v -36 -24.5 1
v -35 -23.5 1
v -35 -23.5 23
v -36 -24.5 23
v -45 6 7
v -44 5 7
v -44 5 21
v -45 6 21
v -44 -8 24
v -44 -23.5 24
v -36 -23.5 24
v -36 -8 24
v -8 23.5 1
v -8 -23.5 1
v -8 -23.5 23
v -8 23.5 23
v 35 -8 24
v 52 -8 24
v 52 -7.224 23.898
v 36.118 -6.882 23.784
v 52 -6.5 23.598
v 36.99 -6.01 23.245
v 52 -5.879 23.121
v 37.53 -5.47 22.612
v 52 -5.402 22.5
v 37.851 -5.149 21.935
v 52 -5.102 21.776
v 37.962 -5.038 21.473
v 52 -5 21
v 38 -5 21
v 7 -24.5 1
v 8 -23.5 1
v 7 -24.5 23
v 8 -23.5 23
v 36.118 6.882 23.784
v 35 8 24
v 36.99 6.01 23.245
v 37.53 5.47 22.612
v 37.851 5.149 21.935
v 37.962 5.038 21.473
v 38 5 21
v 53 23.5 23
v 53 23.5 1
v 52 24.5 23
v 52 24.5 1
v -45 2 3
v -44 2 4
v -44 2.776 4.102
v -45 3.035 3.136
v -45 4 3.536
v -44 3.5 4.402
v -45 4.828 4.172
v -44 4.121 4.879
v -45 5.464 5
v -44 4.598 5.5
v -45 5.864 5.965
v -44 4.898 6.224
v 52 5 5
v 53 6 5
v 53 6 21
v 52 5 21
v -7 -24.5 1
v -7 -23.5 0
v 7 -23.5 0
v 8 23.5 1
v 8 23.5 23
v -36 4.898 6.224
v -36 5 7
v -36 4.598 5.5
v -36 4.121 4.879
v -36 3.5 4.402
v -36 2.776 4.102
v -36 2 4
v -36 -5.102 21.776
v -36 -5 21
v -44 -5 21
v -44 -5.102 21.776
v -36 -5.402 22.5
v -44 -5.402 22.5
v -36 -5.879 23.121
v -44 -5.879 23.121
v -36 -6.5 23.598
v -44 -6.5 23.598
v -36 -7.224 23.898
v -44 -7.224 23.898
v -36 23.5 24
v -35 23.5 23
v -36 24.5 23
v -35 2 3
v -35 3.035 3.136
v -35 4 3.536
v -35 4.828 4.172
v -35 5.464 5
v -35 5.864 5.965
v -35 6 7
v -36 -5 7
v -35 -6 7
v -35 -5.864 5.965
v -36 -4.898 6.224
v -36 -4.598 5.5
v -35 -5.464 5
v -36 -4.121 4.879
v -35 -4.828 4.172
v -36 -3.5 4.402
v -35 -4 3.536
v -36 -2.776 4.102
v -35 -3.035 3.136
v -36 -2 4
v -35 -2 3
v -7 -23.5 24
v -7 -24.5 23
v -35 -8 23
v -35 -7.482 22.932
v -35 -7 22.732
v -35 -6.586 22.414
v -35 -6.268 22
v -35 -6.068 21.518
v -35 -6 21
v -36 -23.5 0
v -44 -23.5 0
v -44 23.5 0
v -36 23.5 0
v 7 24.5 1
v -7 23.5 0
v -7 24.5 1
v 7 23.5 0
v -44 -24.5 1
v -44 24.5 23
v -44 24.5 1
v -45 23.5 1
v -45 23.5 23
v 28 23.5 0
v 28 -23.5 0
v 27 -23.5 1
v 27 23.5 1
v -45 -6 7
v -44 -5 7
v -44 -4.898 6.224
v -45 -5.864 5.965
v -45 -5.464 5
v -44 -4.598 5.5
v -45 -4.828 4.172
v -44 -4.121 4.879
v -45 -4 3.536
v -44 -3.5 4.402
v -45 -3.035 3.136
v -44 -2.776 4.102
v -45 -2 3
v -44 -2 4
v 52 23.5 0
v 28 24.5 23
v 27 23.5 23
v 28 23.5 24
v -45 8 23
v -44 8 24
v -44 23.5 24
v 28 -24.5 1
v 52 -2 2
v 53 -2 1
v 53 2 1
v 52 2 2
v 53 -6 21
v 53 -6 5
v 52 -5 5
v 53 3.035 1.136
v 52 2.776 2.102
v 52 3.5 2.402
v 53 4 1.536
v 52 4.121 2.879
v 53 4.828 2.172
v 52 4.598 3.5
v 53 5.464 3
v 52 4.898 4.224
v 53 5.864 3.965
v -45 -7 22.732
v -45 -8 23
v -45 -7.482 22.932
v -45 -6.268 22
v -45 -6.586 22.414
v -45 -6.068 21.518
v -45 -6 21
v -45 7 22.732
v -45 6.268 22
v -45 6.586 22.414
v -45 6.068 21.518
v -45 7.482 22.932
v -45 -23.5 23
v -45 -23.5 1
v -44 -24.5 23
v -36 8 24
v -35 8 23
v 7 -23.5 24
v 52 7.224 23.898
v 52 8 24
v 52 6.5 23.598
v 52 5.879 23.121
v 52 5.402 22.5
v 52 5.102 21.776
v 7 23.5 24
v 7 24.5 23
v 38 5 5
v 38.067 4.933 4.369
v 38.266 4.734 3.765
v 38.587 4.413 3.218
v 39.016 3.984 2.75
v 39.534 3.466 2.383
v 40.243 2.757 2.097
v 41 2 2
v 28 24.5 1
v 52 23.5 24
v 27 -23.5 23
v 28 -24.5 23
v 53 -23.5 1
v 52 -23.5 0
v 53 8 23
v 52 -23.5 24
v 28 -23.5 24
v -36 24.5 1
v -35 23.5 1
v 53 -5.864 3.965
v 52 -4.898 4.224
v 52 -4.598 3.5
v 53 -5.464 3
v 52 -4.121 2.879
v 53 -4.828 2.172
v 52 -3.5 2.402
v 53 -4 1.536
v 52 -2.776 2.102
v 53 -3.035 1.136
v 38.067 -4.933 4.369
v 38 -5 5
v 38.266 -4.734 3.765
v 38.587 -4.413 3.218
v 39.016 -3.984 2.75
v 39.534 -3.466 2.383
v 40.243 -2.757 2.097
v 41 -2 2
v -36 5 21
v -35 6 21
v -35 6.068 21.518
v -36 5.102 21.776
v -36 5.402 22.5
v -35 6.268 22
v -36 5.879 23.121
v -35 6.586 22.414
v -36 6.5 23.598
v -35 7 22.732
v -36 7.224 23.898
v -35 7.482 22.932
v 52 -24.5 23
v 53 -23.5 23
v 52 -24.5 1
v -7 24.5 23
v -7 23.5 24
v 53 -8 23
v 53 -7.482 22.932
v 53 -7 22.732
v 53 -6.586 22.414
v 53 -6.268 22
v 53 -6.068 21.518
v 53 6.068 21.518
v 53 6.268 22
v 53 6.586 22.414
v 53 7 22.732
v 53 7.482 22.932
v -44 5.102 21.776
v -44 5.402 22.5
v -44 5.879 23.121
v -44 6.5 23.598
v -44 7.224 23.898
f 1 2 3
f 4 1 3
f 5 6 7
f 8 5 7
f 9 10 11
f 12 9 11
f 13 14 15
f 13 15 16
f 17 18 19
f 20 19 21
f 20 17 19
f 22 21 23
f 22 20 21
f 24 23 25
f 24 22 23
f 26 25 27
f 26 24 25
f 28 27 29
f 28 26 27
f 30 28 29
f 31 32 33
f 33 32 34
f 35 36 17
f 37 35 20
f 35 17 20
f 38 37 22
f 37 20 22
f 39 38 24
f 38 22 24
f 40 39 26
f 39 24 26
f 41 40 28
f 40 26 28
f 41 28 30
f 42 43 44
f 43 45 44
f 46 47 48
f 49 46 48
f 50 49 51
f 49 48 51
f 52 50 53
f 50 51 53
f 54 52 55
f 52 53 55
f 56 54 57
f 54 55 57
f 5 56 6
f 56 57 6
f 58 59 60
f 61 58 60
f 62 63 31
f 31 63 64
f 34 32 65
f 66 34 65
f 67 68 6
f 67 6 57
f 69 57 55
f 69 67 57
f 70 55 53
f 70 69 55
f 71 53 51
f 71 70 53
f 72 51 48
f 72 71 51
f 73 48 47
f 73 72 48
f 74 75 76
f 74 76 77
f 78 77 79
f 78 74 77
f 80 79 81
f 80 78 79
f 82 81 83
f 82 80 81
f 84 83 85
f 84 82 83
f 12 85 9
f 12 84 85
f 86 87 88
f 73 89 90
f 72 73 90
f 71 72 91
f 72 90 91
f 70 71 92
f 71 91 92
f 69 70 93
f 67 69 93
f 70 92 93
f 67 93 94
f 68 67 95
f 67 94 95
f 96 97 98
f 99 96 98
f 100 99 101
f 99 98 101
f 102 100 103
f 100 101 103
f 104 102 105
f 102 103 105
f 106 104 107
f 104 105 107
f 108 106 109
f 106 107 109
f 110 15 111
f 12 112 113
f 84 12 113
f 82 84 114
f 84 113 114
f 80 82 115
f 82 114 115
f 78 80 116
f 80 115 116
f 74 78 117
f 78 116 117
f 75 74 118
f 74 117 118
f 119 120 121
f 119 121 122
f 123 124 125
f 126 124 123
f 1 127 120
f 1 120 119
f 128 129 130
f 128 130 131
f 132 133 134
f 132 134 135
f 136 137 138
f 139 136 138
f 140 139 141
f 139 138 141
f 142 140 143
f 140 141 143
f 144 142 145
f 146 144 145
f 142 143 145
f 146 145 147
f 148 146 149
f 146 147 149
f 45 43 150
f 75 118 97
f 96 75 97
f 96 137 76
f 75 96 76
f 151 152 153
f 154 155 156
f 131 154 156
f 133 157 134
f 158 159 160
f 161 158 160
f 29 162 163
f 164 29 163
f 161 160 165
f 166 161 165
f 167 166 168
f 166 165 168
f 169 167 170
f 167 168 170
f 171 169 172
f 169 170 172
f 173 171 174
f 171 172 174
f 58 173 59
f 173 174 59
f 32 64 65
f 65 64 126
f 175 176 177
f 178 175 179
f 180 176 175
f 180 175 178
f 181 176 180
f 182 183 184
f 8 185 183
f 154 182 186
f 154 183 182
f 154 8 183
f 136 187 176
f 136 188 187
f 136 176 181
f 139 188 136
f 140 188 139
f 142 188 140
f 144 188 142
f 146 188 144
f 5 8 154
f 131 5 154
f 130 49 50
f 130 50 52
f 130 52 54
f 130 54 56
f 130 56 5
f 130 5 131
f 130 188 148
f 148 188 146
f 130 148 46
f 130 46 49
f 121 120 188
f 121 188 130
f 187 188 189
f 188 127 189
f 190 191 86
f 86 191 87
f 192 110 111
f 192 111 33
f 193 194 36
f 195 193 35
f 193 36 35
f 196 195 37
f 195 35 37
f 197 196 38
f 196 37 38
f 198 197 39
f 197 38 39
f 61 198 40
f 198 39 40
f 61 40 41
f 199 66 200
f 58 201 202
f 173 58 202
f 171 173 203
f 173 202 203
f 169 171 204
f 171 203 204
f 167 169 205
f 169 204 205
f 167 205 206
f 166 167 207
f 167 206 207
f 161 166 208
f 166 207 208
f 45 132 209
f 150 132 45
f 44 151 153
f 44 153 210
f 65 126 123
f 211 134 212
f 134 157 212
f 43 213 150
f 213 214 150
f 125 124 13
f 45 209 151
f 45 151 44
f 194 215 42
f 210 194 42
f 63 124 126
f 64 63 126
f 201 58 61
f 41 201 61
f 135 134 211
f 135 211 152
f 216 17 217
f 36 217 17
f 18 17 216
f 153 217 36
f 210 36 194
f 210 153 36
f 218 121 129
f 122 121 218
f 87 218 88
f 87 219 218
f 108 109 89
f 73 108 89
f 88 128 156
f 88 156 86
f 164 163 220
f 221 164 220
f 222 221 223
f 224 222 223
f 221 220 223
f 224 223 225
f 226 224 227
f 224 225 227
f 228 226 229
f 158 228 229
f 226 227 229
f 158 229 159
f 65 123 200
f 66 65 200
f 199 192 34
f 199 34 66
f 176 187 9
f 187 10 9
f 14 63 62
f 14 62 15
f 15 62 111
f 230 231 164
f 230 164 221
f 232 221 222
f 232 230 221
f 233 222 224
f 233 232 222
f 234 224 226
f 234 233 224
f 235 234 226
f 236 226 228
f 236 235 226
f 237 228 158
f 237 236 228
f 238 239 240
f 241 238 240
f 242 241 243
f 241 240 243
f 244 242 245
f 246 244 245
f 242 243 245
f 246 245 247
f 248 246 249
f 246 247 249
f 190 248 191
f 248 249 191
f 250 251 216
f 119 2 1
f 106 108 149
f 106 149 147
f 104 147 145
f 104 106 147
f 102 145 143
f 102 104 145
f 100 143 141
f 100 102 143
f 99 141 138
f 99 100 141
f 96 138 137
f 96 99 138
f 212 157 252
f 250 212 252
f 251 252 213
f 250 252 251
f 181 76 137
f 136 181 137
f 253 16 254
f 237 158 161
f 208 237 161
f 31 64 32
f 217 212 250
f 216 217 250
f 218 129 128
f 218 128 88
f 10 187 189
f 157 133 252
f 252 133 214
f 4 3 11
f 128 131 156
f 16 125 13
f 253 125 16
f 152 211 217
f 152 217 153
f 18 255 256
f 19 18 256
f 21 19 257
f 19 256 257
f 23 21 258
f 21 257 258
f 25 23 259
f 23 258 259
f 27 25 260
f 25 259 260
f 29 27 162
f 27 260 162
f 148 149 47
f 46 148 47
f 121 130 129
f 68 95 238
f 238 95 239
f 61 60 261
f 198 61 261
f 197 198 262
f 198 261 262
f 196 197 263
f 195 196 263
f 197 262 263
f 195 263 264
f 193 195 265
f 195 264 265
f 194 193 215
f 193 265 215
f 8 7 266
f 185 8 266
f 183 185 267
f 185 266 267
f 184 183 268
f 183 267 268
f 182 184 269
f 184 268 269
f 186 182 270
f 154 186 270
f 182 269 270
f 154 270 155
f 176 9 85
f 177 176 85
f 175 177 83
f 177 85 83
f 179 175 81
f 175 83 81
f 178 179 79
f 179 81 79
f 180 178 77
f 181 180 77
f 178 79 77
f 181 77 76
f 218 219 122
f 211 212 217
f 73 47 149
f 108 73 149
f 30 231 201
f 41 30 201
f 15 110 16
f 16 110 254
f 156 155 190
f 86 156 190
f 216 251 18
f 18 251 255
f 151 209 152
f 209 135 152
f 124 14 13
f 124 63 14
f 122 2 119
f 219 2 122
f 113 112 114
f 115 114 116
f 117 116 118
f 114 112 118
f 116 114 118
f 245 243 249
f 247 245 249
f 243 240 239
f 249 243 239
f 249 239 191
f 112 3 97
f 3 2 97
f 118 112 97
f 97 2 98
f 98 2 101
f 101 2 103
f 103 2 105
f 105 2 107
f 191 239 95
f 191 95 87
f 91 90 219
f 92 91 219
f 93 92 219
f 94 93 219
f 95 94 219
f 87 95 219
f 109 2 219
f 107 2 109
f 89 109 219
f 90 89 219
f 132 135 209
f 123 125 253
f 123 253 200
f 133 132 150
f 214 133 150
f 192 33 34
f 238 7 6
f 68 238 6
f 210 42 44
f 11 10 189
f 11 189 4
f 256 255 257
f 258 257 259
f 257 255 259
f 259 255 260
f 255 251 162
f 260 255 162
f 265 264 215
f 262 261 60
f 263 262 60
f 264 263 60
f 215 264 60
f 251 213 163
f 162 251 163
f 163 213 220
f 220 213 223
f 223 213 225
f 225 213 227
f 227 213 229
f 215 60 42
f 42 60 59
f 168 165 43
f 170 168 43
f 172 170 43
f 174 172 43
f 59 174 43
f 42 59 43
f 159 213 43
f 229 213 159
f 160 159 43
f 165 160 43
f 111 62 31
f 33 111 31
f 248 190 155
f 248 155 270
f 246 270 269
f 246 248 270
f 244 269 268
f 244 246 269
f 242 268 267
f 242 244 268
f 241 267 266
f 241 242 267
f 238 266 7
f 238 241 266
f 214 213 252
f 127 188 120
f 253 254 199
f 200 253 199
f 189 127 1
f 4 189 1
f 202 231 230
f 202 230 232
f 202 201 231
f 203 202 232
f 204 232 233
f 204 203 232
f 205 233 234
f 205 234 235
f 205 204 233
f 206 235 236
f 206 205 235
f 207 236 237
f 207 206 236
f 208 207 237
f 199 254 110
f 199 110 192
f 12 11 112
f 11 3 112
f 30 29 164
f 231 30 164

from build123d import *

# Parameters (mm, degrees)
F0_W       = 16
F0_H       = 49
F1_DEPTH   = 24
F2_SIZE    = 1
F0_W_2     = 26
F3_DEPTH   = 24
F5_DEPTH   = 15
F0_W_3     = 10
F6_DEPTH   = 24
F8_DEPTH   = 26
F9_R       = 3
F9_2_R     = 3
F10_SIZE   = 0.99999
F10_2_SIZE = 0.99999


# Not quite as in the source:
# - a fillet or chamfer is up to 0.001 mm smaller than in the source, because OpenCascade refuses the exact size


with BuildPart() as f1:
    # F0 (on Top) → F1 (new body)
    with BuildSketch(Plane.XY):
        Rectangle(F0_W, F0_H)
    extrude(amount=F1_DEPTH)

    # F2
    f2_edges = [f1.edges().sort_by_distance(p)[0] for p in [
        (-8, 0, 0),
        (0, -24.5, 0),
        (8, 0, 0),
        (0, 24.5, 0),
        (8, -24.5, 12),
        (8, 24.5, 12),
        (-8, 24.5, 12),
        (-8, -24.5, 12),
        (-8, 0, 24),
        (0, -24.5, 24),
        (8, 0, 24),
        (0, 24.5, 24),
    ]]
    chamfer(f2_edges, length=F2_SIZE)


with BuildPart() as f3:
    # F0 (on Top) → F3 (new body)
    with BuildSketch(Plane.XY):
        with Locations((40, 0)):
            Rectangle(F0_W_2, F0_H)
    extrude(amount=F3_DEPTH)

    # F4 (on face) → F5 (cut)
    with BuildSketch(Plane.YZ.offset(53)):
        Polygon((-5, 2), (0, 2), (5, 2), (5, 24), (-5, 24), align=None)
    extrude(amount=-F5_DEPTH, mode=Mode.SUBTRACT)

    # F9
    f9_edges = [f3.edges().sort_by_distance(p)[0] for p in [
        (45.5, 5, 2),
        (45.5, -5, 2),
        (38, 0, 2),
        (45.5, 5, 24),
        (38, 0, 24),
        (45.5, -5, 24),
    ]]
    fillet(f9_edges, radius=F9_R)

    # F10 (size 1 in the source; OpenCascade refuses exactly that, so slightly less here)
    f10_edges = [f3.edges().sort_by_distance(p)[0] for p in [
        (53, 16.25, 24),
        (53, 5.87868, 23.12132),
        (53, 24.5, 12),
        (53, 5, 13),
        (53, 0, 0),
        (53, 4.12132, 2.87868),
        (53, -24.5, 12),
        (53, 0, 2),
        (53, -16.25, 24),
        (53, -4.12132, 2.87868),
        (53, -5.87868, 23.12132),
        (53, -5, 13),
        (27, -24.5, 12),
        (40, -24.5, 0),
        (40, -24.5, 24),
        (27, 24.5, 12),
        (27, 0, 0),
        (27, 0, 24),
        (40, 24.5, 0),
        (40, 24.5, 24),
    ]]
    chamfer(f10_edges, length=F10_SIZE)


with BuildPart() as f6:
    # F0 (on Top) → F6 (new body)
    with BuildSketch(Plane.XY):
        with Locations((-40, 0)):
            Rectangle(F0_W_3, F0_H)
    extrude(amount=F6_DEPTH)

    # F7 (on face) → F8 (cut)
    with BuildSketch(Plane(origin=(-45, 0, 0), x_dir=(0, -1, 0), z_dir=(-1, 0, 0))):
        Polygon((-5, 4), (0, 4), (5, 4), (5, 24), (-5, 24), align=None)
    extrude(amount=-F8_DEPTH, mode=Mode.SUBTRACT)

    # F9#2
    f9_2_edges = [f6.edges().sort_by_distance(p)[0] for p in [
        (-40, -5, 4),
        (-40, 5, 4),
        (-40, 5, 24),
        (-40, -5, 24),
    ]]
    fillet(f9_2_edges, radius=F9_2_R)

    # F10#2 (size 1 in the source; OpenCascade refuses exactly that, so slightly less here)
    f10_2_edges = [f6.edges().sort_by_distance(p)[0] for p in [
        (-45, -16.25, 24),
        (-45, -5.87868, 23.12132),
        (-45, -24.5, 12),
        (-45, -5, 14),
        (-45, 0, 0),
        (-45, -4.12132, 4.87868),
        (-45, 24.5, 12),
        (-45, 0, 4),
        (-45, 16.25, 24),
        (-45, 4.12132, 4.87868),
        (-45, 5.87868, 23.12132),
        (-45, 5, 14),
        (-35, 16.25, 24),
        (-35, 5.87868, 23.12132),
        (-35, 24.5, 12),
        (-35, 5, 14),
        (-35, 0, 0),
        (-35, 4.12132, 4.87868),
        (-35, -24.5, 12),
        (-35, 0, 4),
        (-35, -16.25, 24),
        (-35, -4.12132, 4.87868),
        (-35, -5.87868, 23.12132),
        (-35, -5, 14),
        (-40, -24.5, 0),
        (-40, 24.5, 0),
        (-40, 24.5, 24),
        (-40, -24.5, 24),
    ]]
    chamfer(f10_2_edges, length=F10_2_SIZE)


solid = Compound([f1.part, f3.part, f6.part])
